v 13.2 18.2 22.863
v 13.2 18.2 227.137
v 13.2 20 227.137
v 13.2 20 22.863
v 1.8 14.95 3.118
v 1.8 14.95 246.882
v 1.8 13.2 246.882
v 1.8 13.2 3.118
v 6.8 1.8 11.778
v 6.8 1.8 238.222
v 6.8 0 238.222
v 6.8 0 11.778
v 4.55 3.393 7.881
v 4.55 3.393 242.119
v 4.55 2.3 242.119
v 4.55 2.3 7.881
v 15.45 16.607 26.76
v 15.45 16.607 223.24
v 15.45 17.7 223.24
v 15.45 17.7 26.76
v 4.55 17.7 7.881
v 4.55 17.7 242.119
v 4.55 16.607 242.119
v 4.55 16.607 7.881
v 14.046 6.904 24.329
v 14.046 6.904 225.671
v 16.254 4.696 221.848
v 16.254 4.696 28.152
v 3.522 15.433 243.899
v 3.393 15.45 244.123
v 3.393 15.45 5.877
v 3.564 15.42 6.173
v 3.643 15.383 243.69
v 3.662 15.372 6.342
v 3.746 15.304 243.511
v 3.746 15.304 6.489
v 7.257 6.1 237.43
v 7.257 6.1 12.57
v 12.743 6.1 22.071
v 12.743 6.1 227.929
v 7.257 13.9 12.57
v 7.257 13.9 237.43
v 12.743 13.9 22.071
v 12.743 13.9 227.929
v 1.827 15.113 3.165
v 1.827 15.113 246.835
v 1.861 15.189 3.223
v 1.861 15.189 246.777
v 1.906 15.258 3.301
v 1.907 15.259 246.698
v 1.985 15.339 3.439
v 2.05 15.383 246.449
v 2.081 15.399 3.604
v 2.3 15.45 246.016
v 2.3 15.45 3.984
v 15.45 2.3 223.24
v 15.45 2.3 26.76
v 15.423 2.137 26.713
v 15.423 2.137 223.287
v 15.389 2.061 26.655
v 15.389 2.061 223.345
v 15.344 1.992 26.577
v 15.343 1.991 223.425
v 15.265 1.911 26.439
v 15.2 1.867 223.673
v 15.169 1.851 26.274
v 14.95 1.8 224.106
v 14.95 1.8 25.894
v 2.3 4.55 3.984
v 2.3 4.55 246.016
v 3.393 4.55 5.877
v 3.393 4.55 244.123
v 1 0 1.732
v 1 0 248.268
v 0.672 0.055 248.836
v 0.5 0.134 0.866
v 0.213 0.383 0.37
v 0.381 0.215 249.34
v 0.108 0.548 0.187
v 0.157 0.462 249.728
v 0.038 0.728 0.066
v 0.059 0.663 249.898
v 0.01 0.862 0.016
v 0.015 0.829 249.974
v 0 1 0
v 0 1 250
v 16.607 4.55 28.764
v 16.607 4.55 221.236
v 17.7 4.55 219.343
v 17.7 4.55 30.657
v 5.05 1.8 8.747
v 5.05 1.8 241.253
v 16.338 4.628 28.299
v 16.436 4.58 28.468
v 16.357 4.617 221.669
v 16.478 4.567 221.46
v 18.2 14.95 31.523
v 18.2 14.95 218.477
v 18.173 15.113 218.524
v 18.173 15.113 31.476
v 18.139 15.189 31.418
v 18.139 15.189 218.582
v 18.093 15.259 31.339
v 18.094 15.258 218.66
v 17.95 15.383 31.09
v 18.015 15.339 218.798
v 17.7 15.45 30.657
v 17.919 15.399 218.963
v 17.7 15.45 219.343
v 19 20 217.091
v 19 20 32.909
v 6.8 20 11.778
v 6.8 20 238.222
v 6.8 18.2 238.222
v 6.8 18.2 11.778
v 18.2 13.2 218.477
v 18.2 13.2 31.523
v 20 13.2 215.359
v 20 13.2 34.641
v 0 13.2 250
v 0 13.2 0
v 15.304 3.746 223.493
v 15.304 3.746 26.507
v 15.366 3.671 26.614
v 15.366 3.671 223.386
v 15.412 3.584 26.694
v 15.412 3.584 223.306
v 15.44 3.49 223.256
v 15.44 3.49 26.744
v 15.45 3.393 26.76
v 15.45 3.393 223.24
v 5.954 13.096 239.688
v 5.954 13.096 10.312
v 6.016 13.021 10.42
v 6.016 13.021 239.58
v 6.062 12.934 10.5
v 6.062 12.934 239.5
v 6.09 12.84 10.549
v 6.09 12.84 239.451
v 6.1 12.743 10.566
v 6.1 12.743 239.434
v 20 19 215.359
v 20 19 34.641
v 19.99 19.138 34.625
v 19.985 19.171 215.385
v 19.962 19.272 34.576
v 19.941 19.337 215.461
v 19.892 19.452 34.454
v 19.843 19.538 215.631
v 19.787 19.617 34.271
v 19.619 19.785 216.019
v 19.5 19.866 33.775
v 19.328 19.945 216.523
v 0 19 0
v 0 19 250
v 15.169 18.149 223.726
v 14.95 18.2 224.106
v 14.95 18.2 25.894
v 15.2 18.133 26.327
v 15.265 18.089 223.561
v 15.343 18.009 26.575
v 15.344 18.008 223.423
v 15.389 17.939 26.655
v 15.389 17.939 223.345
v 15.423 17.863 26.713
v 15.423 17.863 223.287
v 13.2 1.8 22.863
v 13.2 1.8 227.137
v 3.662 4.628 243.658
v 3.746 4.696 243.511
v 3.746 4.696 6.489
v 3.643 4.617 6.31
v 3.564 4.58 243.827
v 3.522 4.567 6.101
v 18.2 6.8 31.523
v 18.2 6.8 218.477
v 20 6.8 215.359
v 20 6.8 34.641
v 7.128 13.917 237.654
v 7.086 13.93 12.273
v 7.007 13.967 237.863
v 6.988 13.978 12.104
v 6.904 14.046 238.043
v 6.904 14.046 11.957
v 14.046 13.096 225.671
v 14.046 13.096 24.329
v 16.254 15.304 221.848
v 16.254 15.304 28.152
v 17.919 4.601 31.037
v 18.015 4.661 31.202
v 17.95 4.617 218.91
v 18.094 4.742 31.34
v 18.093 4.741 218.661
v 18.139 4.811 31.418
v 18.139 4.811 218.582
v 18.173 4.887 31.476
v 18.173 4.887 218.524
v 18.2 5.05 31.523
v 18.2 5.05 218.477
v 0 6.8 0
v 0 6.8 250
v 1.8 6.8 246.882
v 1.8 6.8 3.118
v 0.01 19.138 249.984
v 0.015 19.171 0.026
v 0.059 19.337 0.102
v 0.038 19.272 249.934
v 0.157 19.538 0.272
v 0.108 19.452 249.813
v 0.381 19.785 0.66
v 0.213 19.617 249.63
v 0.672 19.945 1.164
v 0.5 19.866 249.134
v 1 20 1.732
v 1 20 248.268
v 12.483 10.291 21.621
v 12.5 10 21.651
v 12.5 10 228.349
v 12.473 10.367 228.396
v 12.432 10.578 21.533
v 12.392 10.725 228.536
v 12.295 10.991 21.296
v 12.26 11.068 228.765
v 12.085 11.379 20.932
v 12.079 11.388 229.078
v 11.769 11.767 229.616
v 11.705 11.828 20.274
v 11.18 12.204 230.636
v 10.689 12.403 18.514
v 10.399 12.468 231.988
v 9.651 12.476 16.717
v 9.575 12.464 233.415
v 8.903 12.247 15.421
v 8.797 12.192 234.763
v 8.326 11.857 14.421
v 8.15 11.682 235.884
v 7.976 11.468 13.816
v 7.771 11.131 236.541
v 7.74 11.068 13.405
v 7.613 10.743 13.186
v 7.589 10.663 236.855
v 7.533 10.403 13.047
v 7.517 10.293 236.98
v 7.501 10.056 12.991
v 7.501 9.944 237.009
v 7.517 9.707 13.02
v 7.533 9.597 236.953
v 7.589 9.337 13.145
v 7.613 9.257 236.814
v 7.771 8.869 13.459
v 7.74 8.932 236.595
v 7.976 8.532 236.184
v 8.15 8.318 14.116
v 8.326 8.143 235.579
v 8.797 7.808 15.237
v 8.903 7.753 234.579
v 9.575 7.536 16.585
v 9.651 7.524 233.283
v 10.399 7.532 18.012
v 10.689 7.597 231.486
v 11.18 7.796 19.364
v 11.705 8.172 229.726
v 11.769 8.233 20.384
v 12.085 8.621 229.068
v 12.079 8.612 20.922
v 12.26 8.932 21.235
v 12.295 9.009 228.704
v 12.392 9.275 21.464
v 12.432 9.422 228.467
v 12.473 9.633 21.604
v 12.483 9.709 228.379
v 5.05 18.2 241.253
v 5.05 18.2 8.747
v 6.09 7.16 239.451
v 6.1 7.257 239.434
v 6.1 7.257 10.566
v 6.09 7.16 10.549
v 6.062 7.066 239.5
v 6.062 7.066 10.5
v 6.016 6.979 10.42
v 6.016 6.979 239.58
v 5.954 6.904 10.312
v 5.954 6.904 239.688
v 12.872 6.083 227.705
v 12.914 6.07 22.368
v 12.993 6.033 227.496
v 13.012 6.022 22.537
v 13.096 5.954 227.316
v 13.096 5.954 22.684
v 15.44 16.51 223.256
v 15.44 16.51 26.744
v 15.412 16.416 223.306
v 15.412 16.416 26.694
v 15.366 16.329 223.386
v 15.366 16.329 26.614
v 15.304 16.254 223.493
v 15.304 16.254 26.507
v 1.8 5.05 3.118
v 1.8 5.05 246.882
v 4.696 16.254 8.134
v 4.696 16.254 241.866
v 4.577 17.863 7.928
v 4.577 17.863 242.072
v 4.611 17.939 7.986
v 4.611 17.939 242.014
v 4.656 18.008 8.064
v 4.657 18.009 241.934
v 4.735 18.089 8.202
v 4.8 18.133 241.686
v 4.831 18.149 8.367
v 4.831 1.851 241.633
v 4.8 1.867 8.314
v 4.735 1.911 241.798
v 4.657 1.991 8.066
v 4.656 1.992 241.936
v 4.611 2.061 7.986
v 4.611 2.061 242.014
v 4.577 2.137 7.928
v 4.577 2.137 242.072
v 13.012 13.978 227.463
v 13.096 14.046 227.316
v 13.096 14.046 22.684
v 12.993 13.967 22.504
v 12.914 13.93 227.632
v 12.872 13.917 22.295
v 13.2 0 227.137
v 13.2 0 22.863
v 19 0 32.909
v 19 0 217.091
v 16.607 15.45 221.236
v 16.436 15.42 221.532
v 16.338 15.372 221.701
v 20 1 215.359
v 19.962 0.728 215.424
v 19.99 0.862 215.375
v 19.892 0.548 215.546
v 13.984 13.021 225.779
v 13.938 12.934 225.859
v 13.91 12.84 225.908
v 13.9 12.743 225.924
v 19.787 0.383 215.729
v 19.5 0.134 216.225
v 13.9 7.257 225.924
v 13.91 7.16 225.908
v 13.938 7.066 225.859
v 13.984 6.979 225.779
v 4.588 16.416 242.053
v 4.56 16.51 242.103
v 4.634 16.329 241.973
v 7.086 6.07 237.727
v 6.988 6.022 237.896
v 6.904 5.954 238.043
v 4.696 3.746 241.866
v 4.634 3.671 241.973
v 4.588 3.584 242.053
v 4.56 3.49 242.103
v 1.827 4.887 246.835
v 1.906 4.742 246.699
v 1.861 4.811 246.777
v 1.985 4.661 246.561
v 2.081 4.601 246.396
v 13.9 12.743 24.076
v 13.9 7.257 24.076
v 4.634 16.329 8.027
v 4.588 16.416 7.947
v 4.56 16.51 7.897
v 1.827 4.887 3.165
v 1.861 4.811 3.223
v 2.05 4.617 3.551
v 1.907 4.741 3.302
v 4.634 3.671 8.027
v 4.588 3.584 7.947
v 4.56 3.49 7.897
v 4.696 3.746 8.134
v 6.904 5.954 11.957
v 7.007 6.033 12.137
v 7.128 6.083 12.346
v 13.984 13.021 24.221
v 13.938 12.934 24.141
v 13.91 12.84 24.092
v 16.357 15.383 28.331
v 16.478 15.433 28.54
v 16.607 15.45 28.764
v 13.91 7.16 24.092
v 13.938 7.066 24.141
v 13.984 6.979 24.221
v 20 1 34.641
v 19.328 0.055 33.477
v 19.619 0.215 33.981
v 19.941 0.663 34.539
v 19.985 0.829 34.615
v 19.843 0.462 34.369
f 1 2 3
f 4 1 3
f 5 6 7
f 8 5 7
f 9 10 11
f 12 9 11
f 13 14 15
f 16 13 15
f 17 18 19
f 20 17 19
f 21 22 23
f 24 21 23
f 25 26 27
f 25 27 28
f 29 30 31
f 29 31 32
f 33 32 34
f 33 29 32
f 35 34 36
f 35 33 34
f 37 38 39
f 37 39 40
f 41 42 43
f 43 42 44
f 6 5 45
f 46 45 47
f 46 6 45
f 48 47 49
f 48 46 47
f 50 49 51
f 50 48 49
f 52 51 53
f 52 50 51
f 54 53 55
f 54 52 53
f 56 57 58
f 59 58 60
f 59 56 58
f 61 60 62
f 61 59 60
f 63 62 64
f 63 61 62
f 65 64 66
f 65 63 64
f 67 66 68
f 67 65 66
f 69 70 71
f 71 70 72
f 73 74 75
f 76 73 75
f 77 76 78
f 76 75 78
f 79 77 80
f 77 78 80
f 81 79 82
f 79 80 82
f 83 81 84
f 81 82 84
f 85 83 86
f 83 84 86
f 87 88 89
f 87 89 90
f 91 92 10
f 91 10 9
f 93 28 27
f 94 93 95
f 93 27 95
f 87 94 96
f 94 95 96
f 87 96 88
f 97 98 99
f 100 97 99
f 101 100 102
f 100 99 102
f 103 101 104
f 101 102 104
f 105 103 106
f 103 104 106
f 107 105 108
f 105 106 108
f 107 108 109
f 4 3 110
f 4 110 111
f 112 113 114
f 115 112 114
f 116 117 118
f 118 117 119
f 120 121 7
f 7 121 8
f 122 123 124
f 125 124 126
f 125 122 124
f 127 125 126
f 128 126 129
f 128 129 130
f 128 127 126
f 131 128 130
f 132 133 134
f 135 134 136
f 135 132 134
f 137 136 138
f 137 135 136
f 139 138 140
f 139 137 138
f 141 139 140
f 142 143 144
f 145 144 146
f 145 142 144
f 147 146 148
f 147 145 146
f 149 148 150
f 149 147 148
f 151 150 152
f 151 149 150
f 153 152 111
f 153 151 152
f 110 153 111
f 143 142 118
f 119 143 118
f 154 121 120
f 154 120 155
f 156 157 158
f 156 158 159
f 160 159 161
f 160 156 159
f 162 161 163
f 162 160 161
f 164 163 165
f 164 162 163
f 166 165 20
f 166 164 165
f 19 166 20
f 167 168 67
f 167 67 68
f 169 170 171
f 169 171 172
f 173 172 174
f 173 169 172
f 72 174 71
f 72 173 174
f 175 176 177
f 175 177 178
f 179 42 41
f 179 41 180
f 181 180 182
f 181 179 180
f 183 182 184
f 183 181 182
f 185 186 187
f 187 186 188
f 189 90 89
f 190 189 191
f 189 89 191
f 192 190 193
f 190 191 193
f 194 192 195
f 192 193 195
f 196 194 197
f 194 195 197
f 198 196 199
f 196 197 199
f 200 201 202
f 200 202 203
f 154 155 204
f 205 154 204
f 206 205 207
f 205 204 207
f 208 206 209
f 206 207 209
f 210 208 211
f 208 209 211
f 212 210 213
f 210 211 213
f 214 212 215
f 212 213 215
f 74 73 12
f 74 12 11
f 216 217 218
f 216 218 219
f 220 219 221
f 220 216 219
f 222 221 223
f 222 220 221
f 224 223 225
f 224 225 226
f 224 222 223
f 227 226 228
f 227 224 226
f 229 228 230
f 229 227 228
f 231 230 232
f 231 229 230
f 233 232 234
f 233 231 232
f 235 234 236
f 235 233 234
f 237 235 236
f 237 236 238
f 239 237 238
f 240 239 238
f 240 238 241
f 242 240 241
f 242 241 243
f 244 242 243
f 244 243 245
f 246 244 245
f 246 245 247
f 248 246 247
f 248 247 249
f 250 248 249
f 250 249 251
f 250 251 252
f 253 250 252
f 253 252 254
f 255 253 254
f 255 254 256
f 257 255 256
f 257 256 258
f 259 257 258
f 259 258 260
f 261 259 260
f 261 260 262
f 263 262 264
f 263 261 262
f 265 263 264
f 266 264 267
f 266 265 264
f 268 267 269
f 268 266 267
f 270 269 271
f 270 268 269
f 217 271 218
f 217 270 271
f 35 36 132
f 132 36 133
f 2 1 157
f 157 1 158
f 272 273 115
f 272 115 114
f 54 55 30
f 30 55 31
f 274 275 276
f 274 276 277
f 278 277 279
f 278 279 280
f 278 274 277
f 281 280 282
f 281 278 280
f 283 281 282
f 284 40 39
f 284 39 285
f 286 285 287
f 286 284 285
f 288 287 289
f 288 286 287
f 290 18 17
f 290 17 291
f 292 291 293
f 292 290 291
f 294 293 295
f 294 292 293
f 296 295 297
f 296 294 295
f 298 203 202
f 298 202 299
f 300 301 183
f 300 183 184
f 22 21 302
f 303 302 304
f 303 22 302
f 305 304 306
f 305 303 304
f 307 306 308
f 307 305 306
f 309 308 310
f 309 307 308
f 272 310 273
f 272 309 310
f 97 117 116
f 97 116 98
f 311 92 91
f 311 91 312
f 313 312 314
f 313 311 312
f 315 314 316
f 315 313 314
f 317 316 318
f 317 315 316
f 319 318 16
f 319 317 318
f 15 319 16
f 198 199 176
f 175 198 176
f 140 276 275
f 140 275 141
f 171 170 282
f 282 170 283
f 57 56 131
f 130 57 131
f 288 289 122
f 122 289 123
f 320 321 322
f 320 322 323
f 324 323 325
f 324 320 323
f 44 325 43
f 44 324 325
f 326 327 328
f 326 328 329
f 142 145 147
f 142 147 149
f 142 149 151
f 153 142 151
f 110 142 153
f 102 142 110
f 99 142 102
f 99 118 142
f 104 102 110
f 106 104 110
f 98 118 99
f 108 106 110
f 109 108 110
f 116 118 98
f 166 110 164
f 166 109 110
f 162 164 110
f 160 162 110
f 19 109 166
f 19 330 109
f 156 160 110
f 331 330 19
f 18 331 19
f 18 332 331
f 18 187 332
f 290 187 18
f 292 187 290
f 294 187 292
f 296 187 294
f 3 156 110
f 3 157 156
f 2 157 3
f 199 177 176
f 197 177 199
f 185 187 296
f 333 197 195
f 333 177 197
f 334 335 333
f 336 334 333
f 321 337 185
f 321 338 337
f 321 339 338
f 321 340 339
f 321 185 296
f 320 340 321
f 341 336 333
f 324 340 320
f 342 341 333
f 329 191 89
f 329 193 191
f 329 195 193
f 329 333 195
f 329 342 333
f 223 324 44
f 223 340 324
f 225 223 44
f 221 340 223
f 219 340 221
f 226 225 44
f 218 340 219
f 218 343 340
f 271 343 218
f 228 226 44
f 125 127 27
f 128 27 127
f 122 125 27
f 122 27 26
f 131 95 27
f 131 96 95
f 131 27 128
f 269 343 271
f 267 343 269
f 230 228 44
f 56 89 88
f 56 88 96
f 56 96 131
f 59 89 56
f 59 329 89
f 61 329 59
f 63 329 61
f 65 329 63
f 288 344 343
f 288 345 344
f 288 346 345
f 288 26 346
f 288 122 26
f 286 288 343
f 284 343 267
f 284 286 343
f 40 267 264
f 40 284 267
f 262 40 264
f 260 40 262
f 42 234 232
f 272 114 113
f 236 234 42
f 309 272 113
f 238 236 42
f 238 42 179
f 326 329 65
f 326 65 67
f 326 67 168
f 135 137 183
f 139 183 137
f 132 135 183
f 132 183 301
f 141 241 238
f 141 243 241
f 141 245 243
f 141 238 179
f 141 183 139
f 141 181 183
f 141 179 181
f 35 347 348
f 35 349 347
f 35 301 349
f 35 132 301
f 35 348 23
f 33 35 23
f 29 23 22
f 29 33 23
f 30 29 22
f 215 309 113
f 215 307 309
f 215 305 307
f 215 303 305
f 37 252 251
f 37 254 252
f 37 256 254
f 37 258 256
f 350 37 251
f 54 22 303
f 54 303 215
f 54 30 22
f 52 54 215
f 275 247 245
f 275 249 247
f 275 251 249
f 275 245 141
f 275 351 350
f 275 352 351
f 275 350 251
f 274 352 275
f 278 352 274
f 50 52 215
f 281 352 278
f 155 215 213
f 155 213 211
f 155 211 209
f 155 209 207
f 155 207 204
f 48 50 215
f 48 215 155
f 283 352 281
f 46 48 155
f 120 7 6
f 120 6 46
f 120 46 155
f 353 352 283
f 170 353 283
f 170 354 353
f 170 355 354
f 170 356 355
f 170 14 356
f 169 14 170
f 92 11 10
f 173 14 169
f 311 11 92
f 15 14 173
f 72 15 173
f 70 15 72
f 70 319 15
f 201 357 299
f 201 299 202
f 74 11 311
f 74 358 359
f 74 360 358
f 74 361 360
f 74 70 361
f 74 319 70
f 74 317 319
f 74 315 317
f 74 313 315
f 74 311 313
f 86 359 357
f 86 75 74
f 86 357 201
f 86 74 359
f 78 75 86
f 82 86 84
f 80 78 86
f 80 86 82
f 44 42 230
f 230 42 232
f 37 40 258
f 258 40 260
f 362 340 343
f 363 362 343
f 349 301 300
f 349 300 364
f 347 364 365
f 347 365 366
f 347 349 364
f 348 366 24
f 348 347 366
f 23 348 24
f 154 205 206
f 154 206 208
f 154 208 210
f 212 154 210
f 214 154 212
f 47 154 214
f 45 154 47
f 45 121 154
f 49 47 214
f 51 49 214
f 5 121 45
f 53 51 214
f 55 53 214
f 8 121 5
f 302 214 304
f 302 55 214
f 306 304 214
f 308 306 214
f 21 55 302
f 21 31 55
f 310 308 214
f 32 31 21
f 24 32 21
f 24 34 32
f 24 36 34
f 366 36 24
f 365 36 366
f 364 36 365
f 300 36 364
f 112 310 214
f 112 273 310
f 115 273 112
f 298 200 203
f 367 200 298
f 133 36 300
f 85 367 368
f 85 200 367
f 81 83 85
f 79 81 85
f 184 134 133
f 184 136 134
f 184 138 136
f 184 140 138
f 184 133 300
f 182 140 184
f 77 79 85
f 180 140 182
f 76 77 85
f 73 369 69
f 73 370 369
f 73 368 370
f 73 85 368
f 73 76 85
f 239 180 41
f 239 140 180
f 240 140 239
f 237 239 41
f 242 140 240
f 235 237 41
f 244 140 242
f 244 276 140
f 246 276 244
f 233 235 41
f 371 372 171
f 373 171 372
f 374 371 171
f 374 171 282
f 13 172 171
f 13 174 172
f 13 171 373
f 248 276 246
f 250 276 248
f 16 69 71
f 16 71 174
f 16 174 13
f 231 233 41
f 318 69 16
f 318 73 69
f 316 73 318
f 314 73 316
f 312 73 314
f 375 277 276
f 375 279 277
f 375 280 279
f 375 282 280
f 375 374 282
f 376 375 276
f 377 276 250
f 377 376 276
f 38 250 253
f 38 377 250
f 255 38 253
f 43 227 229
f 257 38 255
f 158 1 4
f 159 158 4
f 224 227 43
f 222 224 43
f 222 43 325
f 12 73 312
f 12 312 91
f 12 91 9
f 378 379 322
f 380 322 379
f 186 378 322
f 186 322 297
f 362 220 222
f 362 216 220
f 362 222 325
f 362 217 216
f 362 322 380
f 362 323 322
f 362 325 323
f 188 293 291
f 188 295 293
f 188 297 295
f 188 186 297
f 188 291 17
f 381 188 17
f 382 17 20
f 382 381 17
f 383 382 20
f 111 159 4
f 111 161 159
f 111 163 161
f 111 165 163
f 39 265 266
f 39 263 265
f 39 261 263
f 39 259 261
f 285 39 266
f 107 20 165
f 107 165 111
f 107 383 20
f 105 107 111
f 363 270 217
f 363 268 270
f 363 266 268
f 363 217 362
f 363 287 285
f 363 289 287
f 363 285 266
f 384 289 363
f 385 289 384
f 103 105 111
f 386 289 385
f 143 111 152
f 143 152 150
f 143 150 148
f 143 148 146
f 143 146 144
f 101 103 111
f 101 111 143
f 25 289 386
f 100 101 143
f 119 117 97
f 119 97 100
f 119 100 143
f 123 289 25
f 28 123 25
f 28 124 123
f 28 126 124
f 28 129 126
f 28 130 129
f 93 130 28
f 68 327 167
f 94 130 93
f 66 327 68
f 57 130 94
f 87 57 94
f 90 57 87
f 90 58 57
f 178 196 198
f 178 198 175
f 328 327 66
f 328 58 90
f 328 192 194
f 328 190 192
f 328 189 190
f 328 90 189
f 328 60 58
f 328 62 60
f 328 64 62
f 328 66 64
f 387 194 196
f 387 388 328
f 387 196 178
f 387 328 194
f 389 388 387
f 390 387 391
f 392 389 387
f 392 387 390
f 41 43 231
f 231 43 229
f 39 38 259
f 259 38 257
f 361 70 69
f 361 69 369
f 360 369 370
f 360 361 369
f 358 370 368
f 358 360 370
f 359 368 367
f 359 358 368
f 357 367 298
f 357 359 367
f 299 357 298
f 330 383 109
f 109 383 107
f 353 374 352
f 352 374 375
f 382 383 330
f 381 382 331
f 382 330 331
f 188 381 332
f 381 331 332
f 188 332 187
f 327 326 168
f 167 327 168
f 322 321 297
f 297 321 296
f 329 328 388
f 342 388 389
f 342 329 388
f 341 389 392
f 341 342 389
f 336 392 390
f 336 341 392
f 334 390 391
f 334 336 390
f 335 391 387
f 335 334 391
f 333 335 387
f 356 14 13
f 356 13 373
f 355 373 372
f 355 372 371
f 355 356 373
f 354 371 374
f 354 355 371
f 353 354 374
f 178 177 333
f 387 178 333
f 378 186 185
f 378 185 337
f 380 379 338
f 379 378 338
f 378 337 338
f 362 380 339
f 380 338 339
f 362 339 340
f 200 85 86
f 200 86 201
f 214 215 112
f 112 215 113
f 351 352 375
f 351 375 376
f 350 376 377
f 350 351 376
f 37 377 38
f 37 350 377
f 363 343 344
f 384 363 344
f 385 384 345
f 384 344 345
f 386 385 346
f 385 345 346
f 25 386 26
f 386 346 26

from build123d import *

# Parameters (mm, degrees)
SKETCH1_R           = 2.5
BOSS_EXTRUDE1_DEPTH = 250
FILLET1_R           = 1
FILLET2_R           = 0.5
FILLET3_R           = 0.5
FILLET4_R           = 0.5
FILLET5_R           = 0.5
CUT_EXTRUDE3_DEPTH  = 252.594912508
CUT_EXTRUDE5_DEPTH  = 252.594912508


with BuildPart() as part:
    # Sketch1 → Boss-Extrude1 (new body)
    with BuildSketch(Plane.XY):
        Polygon((13.2, 0), (13.2, 1.8), (15.45, 1.8), (15.45, 3.6), (12.95, 6.1), (7.05, 6.1), (4.55, 3.6), (4.55, 1.8), (6.8, 1.8), (6.8, 0), (0, 0), (0, 6.8), (1.8, 6.8), (1.8, 4.55), (3.6, 4.55), (6.1, 7.05), (6.1, 12.95), (3.6, 15.45), (1.8, 15.45), (1.8, 13.2), (0, 13.2), (0, 20), (6.8, 20), (6.8, 18.2), (4.55, 18.2), (4.55, 16.4), (7.05, 13.9), (12.95, 13.9), (15.45, 16.4), (15.45, 18.2), (13.2, 18.2), (13.2, 20), (20, 20), (20, 13.2), (18.2, 13.2), (18.2, 15.45), (16.4, 15.45), (13.9, 12.95), (13.9, 7.05), (16.4, 4.55), (18.2, 4.55), (18.2, 6.8), (20, 6.8), (20, 0), align=None)
        with Locations((10, 10)):
            Circle(SKETCH1_R, mode=Mode.SUBTRACT)
    extrude(amount=BOSS_EXTRUDE1_DEPTH)

    # Fillet1
    fillet1_edges = [part.edges().sort_by_distance(p)[0] for p in [
        (0, 0, 125),
        (0, 20, 125),
        (20, 20, 125),
        (20, 0, 125),
    ]]
    fillet(fillet1_edges, radius=FILLET1_R)

    # Fillet2
    fillet2_edges = [part.edges().sort_by_distance(p)[0] for p in [
        (4.55, 18.2, 125),
        (4.55, 16.4, 125),
        (7.05, 13.9, 125),
        (12.95, 13.9, 125),
        (15.45, 16.4, 125),
        (15.45, 18.2, 125),
    ]]
    fillet(fillet2_edges, radius=FILLET2_R)

    # Fillet3
    fillet3_edges = [part.edges().sort_by_distance(p)[0] for p in [
        (18.2, 15.45, 125),
        (16.4, 15.45, 125),
        (13.9, 12.95, 125),
        (13.9, 7.05, 125),
        (16.4, 4.55, 125),
        (18.2, 4.55, 125),
    ]]
    fillet(fillet3_edges, radius=FILLET3_R)

    # Fillet4
    fillet4_edges = [part.edges().sort_by_distance(p)[0] for p in [
        (1.8, 4.55, 125),
        (3.6, 4.55, 125),
        (6.1, 7.05, 125),
        (6.1, 12.95, 125),
        (3.6, 15.45, 125),
        (1.8, 15.45, 125),
    ]]
    fillet(fillet4_edges, radius=FILLET4_R)

    # Fillet5
    fillet5_edges = [part.edges().sort_by_distance(p)[0] for p in [
        (15.45, 1.8, 125),
        (15.45, 3.6, 125),
        (12.95, 6.1, 125),
        (7.05, 6.1, 125),
        (4.55, 3.6, 125),
        (4.55, 1.8, 125),
    ]]
    fillet(fillet5_edges, radius=FILLET5_R)

    # Sketch4 → Cut-Extrude3 (cut, through all)
    with BuildSketch(Plane.XZ):
        Polygon((20, 250), (20, 215.358983849), (0, 250), align=None)
    extrude(amount=-CUT_EXTRUDE3_DEPTH, mode=Mode.SUBTRACT)

    # Sketch6 → Cut-Extrude5 (cut, through all)
    with BuildSketch(Plane.XZ):
        Polygon((20, 0), (0, 0), (20, 34.641016151), align=None)
    extrude(amount=-CUT_EXTRUDE5_DEPTH, mode=Mode.SUBTRACT)


solid = part.part
